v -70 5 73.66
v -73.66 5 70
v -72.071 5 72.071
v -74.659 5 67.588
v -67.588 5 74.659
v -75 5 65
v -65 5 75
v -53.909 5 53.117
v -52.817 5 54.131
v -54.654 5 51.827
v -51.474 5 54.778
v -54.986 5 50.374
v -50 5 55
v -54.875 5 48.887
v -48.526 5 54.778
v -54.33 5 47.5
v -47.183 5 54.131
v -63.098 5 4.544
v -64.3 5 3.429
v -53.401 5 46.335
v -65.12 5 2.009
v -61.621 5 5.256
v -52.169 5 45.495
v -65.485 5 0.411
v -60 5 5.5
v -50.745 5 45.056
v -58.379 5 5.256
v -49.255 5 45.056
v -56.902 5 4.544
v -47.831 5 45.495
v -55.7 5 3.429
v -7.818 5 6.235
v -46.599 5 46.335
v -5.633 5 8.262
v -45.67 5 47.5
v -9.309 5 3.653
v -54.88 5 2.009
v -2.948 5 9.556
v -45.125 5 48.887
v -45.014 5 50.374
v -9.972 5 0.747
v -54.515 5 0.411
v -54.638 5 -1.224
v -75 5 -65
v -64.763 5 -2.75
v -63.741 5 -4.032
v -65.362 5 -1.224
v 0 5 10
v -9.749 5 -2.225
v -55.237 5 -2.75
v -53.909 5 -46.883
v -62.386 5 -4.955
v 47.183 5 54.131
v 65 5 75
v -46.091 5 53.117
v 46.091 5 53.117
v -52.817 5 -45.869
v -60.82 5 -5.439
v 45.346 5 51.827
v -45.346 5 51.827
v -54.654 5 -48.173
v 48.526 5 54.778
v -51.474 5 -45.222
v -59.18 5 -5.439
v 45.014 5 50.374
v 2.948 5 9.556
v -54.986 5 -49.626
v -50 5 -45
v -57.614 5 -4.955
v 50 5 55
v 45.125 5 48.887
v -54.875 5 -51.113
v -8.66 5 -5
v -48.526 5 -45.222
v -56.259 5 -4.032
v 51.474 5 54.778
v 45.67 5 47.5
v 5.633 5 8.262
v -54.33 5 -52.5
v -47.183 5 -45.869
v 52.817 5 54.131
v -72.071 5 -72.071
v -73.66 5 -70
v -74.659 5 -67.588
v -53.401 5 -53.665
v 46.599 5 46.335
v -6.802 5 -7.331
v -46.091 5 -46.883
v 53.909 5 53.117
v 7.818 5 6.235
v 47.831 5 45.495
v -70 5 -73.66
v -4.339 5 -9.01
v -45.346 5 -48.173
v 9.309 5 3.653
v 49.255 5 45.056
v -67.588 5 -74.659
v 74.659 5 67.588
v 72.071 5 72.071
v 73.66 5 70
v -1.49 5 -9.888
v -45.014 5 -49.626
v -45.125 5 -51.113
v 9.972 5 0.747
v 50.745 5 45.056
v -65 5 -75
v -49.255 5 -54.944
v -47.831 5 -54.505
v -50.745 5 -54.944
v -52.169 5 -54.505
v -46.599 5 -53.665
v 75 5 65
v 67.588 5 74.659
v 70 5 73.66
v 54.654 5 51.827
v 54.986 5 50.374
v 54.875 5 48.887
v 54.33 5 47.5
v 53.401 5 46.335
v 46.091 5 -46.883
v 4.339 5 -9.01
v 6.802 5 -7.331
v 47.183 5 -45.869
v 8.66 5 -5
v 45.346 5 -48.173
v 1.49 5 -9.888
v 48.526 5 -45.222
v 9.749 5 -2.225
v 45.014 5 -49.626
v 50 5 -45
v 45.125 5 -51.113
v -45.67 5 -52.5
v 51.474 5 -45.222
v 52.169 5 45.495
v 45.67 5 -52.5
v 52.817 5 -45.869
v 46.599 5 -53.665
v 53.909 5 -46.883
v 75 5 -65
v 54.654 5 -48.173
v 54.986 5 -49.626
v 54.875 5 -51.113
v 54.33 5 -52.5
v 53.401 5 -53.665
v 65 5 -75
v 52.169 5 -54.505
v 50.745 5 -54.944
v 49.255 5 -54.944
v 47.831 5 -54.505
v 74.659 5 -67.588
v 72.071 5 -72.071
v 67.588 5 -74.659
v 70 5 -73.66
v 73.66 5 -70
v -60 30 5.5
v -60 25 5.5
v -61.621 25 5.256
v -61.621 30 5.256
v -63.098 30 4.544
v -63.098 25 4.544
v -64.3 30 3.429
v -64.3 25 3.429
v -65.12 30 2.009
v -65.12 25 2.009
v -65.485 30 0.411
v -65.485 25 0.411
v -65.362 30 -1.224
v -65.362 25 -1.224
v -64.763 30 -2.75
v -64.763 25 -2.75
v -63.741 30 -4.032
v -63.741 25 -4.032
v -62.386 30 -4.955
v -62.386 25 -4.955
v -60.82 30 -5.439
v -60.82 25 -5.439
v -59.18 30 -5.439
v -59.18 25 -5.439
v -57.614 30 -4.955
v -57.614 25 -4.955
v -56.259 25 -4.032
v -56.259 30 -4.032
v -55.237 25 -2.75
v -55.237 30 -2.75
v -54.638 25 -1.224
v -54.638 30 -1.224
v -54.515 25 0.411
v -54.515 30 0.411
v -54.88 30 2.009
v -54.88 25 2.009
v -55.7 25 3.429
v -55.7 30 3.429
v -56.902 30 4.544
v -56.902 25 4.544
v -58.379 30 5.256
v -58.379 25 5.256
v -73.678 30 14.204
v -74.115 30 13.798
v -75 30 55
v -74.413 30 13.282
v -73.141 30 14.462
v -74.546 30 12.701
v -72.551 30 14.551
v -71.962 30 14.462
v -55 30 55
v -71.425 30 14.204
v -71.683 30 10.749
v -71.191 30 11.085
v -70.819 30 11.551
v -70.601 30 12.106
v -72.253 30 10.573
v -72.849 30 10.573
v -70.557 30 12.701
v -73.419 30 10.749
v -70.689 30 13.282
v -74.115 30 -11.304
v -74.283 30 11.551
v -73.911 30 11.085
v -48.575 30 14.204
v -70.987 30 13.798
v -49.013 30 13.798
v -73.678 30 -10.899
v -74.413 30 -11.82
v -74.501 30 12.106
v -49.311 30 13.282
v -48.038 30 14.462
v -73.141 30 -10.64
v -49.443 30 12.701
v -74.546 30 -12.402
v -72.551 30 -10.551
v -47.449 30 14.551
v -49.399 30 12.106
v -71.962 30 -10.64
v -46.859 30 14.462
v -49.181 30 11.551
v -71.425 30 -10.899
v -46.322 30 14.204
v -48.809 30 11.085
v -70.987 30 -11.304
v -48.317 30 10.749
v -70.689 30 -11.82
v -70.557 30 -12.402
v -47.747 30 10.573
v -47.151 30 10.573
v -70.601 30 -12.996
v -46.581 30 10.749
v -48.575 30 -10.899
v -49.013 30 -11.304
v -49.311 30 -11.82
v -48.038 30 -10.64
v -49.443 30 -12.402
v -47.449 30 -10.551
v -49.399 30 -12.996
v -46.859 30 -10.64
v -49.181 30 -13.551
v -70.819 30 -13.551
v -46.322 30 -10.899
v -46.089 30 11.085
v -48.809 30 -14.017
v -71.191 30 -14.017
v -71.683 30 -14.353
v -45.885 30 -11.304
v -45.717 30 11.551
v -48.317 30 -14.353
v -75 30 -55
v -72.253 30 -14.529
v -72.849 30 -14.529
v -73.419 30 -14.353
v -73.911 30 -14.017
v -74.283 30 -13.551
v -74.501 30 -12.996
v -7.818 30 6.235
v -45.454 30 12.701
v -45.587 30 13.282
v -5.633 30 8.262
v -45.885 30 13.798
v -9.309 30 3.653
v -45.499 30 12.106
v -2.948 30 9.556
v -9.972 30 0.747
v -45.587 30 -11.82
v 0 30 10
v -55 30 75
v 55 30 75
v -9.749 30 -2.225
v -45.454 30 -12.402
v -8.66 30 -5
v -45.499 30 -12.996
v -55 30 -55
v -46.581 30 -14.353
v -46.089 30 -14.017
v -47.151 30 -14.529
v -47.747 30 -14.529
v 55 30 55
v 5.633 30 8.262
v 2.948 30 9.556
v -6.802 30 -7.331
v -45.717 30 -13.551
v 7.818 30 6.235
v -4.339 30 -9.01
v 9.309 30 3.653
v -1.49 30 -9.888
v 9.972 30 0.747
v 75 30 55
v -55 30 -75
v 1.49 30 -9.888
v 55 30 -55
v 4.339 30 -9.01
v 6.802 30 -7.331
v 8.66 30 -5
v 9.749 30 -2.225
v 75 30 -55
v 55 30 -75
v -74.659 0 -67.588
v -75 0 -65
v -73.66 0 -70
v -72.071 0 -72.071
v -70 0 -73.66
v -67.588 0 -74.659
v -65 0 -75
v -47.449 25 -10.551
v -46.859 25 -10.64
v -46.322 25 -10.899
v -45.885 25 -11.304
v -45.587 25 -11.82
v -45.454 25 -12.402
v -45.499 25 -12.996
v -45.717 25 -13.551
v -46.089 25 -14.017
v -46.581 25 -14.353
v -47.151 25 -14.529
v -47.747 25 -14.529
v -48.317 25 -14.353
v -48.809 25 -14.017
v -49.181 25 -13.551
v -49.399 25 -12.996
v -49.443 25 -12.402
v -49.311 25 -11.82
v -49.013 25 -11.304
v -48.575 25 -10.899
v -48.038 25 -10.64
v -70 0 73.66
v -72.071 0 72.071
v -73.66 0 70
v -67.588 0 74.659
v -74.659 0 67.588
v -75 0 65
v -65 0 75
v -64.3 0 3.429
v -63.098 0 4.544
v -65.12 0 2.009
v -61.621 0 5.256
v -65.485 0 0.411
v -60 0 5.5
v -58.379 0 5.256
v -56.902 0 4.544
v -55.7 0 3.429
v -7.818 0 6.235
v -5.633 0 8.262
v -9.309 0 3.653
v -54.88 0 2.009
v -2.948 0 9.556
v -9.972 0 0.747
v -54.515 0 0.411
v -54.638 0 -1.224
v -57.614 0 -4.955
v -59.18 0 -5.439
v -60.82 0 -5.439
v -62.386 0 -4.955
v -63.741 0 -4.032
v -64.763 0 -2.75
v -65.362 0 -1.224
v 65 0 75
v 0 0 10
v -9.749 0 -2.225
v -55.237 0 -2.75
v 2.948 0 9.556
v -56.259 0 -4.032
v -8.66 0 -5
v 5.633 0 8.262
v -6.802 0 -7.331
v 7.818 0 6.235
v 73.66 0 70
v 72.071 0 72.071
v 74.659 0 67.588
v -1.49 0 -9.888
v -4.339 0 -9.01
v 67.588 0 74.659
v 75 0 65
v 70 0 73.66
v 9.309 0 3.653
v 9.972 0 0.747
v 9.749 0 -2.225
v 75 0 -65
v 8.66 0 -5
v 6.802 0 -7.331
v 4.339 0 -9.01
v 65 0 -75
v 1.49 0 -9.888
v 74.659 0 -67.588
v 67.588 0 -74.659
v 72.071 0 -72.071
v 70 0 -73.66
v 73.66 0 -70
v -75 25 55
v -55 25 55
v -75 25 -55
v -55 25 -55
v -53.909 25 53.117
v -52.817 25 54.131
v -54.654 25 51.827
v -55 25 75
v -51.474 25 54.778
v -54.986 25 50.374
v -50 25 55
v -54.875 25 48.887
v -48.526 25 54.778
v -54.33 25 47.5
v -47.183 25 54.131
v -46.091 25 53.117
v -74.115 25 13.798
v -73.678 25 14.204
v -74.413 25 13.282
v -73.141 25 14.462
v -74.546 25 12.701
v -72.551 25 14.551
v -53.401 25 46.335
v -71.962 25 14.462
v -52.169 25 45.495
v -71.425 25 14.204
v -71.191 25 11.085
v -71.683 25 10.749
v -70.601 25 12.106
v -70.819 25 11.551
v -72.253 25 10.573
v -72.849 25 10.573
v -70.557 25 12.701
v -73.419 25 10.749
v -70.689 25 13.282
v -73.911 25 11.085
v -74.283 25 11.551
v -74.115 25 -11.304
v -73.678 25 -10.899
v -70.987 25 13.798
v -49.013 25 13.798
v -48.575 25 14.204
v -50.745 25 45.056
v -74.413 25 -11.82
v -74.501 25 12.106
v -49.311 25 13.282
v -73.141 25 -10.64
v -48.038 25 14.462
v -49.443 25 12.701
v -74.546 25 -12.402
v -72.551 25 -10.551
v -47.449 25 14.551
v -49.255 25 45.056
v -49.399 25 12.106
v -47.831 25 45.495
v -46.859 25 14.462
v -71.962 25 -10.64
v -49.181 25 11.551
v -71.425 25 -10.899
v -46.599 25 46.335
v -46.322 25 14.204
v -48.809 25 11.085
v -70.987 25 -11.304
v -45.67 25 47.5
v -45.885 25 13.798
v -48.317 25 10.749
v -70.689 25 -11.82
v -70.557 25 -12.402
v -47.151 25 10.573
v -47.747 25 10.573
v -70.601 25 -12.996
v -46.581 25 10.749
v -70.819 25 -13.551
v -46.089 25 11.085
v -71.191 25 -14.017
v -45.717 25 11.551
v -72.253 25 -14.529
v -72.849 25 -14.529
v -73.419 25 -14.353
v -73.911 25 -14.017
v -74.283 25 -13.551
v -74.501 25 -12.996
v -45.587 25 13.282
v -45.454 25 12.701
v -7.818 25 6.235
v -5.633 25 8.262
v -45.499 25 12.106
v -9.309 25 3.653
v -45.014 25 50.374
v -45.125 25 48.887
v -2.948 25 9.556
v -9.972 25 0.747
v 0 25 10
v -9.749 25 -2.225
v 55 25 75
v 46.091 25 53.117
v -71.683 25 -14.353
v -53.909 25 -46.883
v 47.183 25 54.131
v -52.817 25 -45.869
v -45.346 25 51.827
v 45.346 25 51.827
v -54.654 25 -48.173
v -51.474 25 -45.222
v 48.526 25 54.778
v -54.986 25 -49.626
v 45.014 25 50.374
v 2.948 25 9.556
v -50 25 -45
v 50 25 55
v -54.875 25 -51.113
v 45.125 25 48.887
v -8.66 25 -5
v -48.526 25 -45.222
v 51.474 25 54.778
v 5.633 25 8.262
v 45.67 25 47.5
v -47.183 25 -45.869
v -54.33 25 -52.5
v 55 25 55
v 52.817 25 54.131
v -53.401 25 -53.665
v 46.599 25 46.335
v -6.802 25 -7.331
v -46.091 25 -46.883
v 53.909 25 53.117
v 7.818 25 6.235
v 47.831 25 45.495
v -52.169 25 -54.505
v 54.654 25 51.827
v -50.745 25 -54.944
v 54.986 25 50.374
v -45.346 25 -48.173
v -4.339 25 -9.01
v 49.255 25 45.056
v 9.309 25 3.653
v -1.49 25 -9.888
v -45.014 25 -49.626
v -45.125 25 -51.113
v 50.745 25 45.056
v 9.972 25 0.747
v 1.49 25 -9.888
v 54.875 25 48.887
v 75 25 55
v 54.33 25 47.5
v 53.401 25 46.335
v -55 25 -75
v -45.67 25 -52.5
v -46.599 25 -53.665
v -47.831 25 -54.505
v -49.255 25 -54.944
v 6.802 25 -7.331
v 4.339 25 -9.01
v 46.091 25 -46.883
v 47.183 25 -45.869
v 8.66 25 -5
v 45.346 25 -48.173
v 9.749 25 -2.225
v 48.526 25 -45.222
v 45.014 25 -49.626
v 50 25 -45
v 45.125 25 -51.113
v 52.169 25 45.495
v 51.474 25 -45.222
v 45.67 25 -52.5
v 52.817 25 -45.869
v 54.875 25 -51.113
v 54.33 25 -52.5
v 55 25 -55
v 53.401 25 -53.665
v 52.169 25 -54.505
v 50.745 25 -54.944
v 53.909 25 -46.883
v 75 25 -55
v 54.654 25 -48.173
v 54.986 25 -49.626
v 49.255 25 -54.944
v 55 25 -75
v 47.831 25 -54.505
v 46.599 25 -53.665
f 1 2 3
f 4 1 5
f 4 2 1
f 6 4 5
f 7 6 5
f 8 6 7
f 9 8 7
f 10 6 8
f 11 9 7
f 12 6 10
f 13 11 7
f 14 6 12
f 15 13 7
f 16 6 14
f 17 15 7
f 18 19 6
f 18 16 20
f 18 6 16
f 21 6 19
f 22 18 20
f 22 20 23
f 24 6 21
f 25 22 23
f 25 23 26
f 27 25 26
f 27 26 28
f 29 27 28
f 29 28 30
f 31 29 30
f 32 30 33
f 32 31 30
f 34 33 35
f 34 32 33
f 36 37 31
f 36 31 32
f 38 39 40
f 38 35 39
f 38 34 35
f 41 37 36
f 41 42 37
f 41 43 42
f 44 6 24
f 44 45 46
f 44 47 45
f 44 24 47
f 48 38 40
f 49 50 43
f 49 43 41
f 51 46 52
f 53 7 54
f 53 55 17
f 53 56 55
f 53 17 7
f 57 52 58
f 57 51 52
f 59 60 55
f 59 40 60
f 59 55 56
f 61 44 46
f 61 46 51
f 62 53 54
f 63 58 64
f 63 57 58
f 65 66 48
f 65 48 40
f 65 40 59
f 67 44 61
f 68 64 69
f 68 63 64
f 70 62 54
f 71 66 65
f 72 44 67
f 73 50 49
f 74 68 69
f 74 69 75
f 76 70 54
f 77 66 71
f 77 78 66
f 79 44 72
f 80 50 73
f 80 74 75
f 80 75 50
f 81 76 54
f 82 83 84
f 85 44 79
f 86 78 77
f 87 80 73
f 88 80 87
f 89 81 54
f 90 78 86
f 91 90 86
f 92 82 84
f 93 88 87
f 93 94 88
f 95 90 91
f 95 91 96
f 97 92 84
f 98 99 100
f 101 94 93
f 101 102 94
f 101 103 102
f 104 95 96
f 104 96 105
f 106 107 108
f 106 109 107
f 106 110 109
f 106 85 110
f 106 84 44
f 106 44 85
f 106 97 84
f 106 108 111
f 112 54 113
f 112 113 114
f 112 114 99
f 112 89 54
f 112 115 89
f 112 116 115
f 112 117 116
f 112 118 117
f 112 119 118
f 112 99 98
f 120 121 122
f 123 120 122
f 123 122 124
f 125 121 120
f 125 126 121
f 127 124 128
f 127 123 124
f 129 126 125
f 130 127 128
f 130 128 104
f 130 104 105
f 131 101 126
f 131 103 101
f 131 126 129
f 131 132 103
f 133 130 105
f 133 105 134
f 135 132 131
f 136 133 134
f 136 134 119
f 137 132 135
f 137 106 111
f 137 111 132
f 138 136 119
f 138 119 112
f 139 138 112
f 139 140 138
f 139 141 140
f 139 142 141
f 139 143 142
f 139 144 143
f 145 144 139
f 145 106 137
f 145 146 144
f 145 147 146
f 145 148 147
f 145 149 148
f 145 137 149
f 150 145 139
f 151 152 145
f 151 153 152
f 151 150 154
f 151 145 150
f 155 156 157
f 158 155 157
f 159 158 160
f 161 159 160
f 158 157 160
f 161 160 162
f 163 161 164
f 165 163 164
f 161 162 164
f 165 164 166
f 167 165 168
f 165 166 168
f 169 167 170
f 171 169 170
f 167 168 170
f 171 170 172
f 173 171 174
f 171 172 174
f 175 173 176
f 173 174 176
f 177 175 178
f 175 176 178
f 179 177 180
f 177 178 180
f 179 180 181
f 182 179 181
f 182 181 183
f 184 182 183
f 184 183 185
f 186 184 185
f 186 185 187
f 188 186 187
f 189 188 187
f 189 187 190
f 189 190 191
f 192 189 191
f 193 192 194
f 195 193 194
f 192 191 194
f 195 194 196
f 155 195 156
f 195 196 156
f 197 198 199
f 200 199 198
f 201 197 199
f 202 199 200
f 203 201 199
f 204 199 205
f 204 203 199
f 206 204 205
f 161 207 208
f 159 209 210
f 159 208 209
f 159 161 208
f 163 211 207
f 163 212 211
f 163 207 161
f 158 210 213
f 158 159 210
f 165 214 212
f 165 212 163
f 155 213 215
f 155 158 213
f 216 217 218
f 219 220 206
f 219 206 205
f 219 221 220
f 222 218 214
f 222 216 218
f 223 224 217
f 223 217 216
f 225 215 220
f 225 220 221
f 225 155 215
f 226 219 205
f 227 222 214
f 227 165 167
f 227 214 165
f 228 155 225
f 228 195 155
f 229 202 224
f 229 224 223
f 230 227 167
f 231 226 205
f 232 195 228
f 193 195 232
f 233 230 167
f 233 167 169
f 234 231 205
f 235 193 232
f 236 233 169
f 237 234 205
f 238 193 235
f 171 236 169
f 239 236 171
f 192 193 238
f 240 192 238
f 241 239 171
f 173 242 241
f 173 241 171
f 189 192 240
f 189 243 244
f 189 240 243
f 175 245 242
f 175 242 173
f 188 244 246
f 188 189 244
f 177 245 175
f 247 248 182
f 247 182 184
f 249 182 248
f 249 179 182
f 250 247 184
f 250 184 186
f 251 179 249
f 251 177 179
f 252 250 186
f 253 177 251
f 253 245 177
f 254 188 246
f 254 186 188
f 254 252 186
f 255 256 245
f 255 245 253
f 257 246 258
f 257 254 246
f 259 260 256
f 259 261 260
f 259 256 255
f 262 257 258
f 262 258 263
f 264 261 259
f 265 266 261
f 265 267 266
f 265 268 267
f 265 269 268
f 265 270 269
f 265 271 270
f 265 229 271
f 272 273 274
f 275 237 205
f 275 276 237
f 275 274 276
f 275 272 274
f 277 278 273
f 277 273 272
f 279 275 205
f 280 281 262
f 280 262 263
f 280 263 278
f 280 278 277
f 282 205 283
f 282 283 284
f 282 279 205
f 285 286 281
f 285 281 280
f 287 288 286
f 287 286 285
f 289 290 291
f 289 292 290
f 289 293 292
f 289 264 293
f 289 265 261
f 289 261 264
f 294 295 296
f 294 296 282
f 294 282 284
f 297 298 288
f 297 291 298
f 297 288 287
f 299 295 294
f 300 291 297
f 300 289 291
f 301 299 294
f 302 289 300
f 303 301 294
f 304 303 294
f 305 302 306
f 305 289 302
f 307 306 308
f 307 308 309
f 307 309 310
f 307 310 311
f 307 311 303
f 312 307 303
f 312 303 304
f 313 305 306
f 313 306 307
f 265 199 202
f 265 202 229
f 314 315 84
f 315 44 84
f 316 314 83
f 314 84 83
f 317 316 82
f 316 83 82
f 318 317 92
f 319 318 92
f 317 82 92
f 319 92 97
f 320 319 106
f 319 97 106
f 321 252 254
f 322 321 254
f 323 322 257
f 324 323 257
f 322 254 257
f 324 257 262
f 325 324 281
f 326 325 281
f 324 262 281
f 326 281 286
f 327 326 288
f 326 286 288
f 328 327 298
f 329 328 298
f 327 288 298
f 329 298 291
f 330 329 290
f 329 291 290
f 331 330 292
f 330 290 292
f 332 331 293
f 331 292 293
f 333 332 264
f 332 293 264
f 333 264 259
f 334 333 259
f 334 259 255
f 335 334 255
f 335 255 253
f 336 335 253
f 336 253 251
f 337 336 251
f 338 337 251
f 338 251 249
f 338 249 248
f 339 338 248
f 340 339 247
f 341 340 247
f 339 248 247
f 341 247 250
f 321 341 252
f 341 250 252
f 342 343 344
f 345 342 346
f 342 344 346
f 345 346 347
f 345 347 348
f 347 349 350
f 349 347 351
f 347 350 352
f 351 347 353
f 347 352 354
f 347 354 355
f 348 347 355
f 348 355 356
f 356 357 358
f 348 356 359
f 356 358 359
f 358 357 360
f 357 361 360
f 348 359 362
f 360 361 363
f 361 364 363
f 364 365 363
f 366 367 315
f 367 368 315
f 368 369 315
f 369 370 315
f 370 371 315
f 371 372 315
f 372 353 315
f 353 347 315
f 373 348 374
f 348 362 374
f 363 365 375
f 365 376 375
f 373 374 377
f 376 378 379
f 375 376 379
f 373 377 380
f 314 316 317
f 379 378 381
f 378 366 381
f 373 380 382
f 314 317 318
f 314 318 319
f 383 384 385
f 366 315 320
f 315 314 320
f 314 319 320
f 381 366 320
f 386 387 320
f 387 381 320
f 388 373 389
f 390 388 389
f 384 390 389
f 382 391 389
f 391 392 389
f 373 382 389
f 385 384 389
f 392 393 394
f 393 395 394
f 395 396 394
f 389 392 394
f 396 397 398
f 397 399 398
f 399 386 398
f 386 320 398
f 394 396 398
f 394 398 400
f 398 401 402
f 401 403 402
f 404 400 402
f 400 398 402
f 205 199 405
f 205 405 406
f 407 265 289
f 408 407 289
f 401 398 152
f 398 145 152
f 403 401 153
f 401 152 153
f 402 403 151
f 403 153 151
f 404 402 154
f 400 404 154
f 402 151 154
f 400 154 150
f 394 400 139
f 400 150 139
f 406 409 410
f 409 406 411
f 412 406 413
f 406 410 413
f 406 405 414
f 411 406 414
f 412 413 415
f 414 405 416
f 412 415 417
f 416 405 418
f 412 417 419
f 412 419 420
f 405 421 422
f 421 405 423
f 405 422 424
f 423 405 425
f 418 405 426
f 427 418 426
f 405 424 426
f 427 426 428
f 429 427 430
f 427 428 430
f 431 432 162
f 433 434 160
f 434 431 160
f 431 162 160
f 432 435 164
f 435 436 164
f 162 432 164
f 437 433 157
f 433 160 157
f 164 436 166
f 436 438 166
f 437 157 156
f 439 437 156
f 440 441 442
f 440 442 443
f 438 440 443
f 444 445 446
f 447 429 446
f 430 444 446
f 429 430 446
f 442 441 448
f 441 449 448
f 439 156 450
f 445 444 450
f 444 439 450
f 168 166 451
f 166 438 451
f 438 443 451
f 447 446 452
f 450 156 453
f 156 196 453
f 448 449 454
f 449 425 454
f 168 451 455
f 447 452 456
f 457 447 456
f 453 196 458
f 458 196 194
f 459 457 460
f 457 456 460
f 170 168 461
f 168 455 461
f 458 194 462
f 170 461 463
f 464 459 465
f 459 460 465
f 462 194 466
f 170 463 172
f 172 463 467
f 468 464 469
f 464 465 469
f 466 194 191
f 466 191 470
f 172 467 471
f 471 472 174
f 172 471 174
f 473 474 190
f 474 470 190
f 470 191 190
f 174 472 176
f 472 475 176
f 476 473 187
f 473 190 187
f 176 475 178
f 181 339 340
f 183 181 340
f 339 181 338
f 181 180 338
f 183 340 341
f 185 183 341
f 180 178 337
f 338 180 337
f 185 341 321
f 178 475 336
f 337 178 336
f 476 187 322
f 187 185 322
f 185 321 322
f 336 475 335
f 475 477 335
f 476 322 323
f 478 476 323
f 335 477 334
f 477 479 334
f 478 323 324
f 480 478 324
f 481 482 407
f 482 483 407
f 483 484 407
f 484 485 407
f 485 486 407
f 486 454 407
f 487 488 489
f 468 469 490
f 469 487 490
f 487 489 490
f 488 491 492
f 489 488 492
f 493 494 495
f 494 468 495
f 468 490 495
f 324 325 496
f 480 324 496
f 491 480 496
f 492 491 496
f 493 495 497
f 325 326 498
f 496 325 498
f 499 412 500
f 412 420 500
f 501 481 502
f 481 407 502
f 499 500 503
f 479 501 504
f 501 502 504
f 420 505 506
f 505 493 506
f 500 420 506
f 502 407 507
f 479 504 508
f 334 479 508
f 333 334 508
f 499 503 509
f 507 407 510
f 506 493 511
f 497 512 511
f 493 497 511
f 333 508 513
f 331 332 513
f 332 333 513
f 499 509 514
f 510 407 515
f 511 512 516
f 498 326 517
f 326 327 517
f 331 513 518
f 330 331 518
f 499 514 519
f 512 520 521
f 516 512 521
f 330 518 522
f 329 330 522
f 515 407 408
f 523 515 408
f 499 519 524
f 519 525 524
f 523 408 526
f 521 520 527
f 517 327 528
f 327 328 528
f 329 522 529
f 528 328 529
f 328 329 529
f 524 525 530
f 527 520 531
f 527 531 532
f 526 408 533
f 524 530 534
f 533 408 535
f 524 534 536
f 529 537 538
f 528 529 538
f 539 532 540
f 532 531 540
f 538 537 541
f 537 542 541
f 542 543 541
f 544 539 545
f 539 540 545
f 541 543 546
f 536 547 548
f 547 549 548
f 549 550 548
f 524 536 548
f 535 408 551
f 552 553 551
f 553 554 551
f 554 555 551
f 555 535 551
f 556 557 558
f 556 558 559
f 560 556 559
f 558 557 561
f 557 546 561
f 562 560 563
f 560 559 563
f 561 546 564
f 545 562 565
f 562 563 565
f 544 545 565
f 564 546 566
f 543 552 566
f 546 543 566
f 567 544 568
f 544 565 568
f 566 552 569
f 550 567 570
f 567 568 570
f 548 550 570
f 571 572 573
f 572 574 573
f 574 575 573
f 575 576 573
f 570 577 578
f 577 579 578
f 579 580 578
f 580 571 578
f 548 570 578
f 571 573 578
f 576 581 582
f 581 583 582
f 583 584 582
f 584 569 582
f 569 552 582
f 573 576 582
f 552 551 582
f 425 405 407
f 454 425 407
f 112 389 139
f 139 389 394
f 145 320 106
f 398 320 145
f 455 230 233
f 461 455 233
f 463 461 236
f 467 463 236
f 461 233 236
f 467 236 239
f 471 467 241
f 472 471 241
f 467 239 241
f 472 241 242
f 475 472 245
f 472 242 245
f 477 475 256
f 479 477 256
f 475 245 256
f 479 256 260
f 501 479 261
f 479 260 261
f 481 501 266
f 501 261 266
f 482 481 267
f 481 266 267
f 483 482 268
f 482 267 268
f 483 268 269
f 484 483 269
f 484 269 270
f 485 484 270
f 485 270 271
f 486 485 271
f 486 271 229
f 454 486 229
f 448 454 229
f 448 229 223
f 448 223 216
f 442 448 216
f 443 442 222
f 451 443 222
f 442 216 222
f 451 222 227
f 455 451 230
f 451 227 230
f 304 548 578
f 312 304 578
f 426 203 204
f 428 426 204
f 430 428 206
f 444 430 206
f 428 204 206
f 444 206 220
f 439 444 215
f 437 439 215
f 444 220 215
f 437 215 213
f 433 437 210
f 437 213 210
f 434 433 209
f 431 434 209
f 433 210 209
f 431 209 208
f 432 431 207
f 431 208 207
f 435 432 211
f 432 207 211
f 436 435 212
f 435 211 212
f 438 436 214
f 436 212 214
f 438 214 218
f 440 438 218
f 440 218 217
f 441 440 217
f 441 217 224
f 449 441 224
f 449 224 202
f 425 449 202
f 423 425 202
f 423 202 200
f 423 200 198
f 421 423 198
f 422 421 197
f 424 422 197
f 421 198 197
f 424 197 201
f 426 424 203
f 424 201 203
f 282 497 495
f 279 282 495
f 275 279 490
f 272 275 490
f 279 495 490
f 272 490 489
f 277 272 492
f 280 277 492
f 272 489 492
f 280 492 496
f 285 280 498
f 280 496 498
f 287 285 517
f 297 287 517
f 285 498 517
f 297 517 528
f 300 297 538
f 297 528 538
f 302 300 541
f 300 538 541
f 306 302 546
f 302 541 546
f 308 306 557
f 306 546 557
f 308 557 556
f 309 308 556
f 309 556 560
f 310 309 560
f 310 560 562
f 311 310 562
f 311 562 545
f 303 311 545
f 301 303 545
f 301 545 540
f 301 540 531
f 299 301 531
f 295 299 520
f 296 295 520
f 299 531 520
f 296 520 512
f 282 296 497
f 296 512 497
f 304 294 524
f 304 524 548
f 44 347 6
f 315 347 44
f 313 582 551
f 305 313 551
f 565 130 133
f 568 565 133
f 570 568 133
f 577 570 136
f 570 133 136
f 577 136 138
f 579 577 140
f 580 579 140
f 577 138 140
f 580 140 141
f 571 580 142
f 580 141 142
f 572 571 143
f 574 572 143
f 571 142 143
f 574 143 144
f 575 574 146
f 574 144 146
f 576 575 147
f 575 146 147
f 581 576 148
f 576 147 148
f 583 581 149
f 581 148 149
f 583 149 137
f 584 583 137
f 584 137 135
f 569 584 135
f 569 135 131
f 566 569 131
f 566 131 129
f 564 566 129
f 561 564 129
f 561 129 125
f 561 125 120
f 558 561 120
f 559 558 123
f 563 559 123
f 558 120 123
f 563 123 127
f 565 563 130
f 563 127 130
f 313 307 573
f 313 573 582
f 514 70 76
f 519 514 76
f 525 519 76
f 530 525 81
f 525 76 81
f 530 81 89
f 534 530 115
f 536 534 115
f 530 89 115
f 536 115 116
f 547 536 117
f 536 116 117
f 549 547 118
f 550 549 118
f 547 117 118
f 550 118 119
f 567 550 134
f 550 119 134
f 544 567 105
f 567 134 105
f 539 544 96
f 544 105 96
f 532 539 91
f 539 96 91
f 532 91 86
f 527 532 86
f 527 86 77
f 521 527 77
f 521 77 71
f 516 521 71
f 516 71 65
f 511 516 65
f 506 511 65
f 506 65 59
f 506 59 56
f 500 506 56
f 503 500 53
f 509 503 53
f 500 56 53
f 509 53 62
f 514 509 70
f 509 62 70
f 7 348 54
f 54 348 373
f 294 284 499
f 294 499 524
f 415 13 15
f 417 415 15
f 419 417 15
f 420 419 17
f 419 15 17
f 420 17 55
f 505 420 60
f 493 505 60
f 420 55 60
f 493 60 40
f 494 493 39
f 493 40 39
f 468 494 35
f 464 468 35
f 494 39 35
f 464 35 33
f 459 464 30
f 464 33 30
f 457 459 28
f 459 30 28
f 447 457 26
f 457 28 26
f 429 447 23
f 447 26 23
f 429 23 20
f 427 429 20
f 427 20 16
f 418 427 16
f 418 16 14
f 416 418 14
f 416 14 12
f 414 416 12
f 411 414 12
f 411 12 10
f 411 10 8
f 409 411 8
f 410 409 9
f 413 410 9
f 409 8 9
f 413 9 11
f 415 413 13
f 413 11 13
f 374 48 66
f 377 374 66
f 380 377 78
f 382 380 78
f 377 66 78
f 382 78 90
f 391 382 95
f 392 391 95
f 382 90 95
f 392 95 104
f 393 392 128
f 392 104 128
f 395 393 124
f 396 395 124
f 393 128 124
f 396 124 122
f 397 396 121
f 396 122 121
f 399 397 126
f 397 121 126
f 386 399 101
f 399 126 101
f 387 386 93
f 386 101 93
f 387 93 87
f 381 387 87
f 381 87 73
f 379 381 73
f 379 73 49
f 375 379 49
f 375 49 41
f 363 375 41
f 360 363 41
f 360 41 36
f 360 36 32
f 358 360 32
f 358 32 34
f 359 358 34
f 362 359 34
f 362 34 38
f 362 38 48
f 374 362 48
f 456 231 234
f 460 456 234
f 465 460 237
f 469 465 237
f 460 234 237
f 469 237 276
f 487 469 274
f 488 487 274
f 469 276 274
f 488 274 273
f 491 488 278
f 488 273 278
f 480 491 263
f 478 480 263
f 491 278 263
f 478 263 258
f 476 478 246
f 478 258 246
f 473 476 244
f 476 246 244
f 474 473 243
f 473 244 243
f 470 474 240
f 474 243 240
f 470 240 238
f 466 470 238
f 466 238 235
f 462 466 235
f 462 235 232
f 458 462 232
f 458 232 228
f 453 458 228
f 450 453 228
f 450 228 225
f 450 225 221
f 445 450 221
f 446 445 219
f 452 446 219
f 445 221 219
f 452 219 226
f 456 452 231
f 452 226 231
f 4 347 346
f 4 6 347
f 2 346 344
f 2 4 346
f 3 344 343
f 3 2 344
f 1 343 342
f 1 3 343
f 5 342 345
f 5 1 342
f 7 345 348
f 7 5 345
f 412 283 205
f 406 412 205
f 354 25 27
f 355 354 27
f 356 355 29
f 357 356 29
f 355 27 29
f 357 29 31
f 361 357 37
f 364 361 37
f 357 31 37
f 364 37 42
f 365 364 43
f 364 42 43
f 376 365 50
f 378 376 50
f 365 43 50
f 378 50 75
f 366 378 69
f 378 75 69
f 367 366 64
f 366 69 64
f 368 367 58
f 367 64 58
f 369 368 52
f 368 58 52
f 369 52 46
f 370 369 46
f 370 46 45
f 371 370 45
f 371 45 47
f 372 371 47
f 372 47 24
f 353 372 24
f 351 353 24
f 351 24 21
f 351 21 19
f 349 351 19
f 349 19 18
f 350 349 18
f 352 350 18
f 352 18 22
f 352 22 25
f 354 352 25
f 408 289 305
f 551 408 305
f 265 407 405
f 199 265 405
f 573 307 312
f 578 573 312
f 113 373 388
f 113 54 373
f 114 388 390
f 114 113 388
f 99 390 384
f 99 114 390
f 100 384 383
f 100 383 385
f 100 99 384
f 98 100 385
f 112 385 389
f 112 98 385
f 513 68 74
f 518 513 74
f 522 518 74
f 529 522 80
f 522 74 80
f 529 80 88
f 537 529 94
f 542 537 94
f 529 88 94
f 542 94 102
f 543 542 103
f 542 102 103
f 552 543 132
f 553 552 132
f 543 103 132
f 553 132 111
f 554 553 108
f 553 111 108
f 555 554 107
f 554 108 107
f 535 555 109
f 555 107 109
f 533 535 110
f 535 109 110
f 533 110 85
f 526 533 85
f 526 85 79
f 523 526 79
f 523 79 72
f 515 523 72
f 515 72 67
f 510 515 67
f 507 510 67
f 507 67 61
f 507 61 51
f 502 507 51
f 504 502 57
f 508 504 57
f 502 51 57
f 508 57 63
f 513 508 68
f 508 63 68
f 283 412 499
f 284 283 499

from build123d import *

# Parameters (mm, degrees)
SKETCH2_W           = 150
SKETCH2_H           = 150
BOSS_EXTRUDE1_DEPTH = 5
SKETCH3_R           = 5
BOSS_EXTRUDE2_DEPTH = 20
SKETCH4_R           = 10
CUT_EXTRUDE1_DEPTH  = 108.935165725
SKETCH5_R           = 5.5
CUT_EXTRUDE2_DEPTH  = 20
FILLET1_R           = 10
SKETCH6_R           = 5
BOSS_EXTRUDE3_DEPTH = 5
SKETCH8_R           = 10
SKETCH8_R_2         = 5.5
CUT_EXTRUDE3_DEPTH  = 5
SKETCH9_R           = 2
SKETCH9_R_2         = 5.5
CUT_EXTRUDE4_DEPTH  = 5
SKETCH10_W          = 20
SKETCH10_H          = 20
CUT_EXTRUDE5_DEPTH  = 10


with BuildPart() as part:
    # Sketch2 → Boss-Extrude1 (new body)
    with BuildSketch(Plane(origin=(0, 0, 0), x_dir=(1, 0, 0), z_dir=(0, 1, 0))):
        Rectangle(SKETCH2_W, SKETCH2_H)
    extrude(amount=BOSS_EXTRUDE1_DEPTH)

    # Sketch3 → Boss-Extrude2 (add)
    with BuildSketch(Plane(origin=(0, 5, 0), x_dir=(1, 0, 0), z_dir=(0, 1, 0))):
        with Locations(Location((50, 50, 0), (0, 0, 270))):
            Circle(SKETCH3_R)
        with Locations(Location((50, -50, 0), (0, 0, 270))):
            Circle(SKETCH3_R)
        with Locations(Location((-50, -50, 0), (0, 0, 270))):
            Circle(SKETCH3_R)
        with Locations(Location((-50, 50, 0), (0, 0, 270))):
            Circle(SKETCH3_R)
    extrude(amount=BOSS_EXTRUDE2_DEPTH)

    # Sketch4 → Cut-Extrude1 (cut, through all)
    with BuildSketch(Plane(origin=(0, 5, 0), x_dir=(1, 0, 0), z_dir=(0, 1, 0))):
        with Locations(Location((0, 0, 0), (0, 0, 270))):
            Circle(SKETCH4_R)
    extrude(amount=-CUT_EXTRUDE1_DEPTH, mode=Mode.SUBTRACT)

    # Sketch5 → Cut-Extrude2 (cut)
    with BuildSketch(Plane(origin=(0, 5, 0), x_dir=(1, 0, 0), z_dir=(0, 1, 0))):
        with Locations(Location((-60, 0, 0), (0, 0, 270))):
            Circle(SKETCH5_R)
    extrude(amount=-CUT_EXTRUDE2_DEPTH, mode=Mode.SUBTRACT)

    # Fillet1
    fillet1_edges = [part.edges().sort_by_distance(p)[0] for p in [
        (75, 2.5, 75),
        (-75, 2.5, 75),
        (-75, 2.5, -75),
        (75, 2.5, -75),
    ]]
    fillet(fillet1_edges, radius=FILLET1_R)

    # Sketch6 → Boss-Extrude3 (add)
    with BuildSketch(Plane(origin=(0, 25, 0), x_dir=(1, 0, 0), z_dir=(0, 1, 0))):
        with BuildLine():
            Line((65, 75), (-65, 75))
            ThreePointArc((-65, 75), (-72.071067812, 72.071067812), (-75, 65))
            Line((-75, 65), (-75, -65))
            ThreePointArc((-75, -65), (-72.071067812, -72.071067812), (-65, -75))
            Line((-65, -75), (65, -75))
            ThreePointArc((65, -75), (72.071067812, -72.071067812), (75, -65))
            Line((75, -65), (75, 65))
            ThreePointArc((75, 65), (72.071067812, 72.071067812), (65, 75))
        make_face()
        with Locations(Location((-50, 50, 0), (0, 0, 270))):
            Circle(SKETCH6_R, mode=Mode.SUBTRACT)
        with Locations(Location((-50, 50, 0), (0, 0, 270))):
            Circle(SKETCH6_R)
    extrude(amount=BOSS_EXTRUDE3_DEPTH)

    # Sketch8 → Cut-Extrude3 (cut)
    with BuildSketch(Plane.XZ.offset(-25)):
        with Locations(Location((0, 0, 0), (0, 0, 90))):
            Circle(SKETCH8_R)
        with Locations(Location((-60, 0, 0), (0, 0, 90))):
            Circle(SKETCH8_R_2)
    extrude(amount=-CUT_EXTRUDE3_DEPTH, mode=Mode.SUBTRACT)

    # Sketch9 → Cut-Extrude4 (cut)
    with BuildSketch(Plane(origin=(0, 30, 0), x_dir=(1, 0, 0), z_dir=(0, 1, 0))):
        with Locations(Location((-47.448854634, 12.551145366, 0), (0, 0, 270))):
            Circle(SKETCH9_R)
        with Locations(Location((-60, 0, 0), (0, 0, 270))):
            Circle(SKETCH9_R_2)
        with Locations(Location((-47.448854634, -12.551145366, 0), (0, 0, 270))):
            Circle(SKETCH9_R)
        with Locations(Location((-72.551145366, -12.551145366, 0), (0, 0, 270))):
            Circle(SKETCH9_R)
        with Locations(Location((-72.551145366, 12.551145366, 0), (0, 0, 270))):
            Circle(SKETCH9_R)
    extrude(amount=-CUT_EXTRUDE4_DEPTH, mode=Mode.SUBTRACT)

    # Sketch10 → Cut-Extrude5 (cut)
    with BuildSketch(Plane(origin=(0, 30, 0), x_dir=(1, 0, 0), z_dir=(0, 1, 0))):
        with Locations((-65, 65)):
            Rectangle(SKETCH10_W, SKETCH10_H)
        with Locations((65, 65)):
            Rectangle(SKETCH10_W, SKETCH10_H)
        with Locations((65, -65)):
            Rectangle(SKETCH10_W, SKETCH10_H)
        with Locations((-65, -65)):
            Rectangle(SKETCH10_W, SKETCH10_H)
    extrude(amount=-CUT_EXTRUDE5_DEPTH, mode=Mode.SUBTRACT)


solid = part.part
